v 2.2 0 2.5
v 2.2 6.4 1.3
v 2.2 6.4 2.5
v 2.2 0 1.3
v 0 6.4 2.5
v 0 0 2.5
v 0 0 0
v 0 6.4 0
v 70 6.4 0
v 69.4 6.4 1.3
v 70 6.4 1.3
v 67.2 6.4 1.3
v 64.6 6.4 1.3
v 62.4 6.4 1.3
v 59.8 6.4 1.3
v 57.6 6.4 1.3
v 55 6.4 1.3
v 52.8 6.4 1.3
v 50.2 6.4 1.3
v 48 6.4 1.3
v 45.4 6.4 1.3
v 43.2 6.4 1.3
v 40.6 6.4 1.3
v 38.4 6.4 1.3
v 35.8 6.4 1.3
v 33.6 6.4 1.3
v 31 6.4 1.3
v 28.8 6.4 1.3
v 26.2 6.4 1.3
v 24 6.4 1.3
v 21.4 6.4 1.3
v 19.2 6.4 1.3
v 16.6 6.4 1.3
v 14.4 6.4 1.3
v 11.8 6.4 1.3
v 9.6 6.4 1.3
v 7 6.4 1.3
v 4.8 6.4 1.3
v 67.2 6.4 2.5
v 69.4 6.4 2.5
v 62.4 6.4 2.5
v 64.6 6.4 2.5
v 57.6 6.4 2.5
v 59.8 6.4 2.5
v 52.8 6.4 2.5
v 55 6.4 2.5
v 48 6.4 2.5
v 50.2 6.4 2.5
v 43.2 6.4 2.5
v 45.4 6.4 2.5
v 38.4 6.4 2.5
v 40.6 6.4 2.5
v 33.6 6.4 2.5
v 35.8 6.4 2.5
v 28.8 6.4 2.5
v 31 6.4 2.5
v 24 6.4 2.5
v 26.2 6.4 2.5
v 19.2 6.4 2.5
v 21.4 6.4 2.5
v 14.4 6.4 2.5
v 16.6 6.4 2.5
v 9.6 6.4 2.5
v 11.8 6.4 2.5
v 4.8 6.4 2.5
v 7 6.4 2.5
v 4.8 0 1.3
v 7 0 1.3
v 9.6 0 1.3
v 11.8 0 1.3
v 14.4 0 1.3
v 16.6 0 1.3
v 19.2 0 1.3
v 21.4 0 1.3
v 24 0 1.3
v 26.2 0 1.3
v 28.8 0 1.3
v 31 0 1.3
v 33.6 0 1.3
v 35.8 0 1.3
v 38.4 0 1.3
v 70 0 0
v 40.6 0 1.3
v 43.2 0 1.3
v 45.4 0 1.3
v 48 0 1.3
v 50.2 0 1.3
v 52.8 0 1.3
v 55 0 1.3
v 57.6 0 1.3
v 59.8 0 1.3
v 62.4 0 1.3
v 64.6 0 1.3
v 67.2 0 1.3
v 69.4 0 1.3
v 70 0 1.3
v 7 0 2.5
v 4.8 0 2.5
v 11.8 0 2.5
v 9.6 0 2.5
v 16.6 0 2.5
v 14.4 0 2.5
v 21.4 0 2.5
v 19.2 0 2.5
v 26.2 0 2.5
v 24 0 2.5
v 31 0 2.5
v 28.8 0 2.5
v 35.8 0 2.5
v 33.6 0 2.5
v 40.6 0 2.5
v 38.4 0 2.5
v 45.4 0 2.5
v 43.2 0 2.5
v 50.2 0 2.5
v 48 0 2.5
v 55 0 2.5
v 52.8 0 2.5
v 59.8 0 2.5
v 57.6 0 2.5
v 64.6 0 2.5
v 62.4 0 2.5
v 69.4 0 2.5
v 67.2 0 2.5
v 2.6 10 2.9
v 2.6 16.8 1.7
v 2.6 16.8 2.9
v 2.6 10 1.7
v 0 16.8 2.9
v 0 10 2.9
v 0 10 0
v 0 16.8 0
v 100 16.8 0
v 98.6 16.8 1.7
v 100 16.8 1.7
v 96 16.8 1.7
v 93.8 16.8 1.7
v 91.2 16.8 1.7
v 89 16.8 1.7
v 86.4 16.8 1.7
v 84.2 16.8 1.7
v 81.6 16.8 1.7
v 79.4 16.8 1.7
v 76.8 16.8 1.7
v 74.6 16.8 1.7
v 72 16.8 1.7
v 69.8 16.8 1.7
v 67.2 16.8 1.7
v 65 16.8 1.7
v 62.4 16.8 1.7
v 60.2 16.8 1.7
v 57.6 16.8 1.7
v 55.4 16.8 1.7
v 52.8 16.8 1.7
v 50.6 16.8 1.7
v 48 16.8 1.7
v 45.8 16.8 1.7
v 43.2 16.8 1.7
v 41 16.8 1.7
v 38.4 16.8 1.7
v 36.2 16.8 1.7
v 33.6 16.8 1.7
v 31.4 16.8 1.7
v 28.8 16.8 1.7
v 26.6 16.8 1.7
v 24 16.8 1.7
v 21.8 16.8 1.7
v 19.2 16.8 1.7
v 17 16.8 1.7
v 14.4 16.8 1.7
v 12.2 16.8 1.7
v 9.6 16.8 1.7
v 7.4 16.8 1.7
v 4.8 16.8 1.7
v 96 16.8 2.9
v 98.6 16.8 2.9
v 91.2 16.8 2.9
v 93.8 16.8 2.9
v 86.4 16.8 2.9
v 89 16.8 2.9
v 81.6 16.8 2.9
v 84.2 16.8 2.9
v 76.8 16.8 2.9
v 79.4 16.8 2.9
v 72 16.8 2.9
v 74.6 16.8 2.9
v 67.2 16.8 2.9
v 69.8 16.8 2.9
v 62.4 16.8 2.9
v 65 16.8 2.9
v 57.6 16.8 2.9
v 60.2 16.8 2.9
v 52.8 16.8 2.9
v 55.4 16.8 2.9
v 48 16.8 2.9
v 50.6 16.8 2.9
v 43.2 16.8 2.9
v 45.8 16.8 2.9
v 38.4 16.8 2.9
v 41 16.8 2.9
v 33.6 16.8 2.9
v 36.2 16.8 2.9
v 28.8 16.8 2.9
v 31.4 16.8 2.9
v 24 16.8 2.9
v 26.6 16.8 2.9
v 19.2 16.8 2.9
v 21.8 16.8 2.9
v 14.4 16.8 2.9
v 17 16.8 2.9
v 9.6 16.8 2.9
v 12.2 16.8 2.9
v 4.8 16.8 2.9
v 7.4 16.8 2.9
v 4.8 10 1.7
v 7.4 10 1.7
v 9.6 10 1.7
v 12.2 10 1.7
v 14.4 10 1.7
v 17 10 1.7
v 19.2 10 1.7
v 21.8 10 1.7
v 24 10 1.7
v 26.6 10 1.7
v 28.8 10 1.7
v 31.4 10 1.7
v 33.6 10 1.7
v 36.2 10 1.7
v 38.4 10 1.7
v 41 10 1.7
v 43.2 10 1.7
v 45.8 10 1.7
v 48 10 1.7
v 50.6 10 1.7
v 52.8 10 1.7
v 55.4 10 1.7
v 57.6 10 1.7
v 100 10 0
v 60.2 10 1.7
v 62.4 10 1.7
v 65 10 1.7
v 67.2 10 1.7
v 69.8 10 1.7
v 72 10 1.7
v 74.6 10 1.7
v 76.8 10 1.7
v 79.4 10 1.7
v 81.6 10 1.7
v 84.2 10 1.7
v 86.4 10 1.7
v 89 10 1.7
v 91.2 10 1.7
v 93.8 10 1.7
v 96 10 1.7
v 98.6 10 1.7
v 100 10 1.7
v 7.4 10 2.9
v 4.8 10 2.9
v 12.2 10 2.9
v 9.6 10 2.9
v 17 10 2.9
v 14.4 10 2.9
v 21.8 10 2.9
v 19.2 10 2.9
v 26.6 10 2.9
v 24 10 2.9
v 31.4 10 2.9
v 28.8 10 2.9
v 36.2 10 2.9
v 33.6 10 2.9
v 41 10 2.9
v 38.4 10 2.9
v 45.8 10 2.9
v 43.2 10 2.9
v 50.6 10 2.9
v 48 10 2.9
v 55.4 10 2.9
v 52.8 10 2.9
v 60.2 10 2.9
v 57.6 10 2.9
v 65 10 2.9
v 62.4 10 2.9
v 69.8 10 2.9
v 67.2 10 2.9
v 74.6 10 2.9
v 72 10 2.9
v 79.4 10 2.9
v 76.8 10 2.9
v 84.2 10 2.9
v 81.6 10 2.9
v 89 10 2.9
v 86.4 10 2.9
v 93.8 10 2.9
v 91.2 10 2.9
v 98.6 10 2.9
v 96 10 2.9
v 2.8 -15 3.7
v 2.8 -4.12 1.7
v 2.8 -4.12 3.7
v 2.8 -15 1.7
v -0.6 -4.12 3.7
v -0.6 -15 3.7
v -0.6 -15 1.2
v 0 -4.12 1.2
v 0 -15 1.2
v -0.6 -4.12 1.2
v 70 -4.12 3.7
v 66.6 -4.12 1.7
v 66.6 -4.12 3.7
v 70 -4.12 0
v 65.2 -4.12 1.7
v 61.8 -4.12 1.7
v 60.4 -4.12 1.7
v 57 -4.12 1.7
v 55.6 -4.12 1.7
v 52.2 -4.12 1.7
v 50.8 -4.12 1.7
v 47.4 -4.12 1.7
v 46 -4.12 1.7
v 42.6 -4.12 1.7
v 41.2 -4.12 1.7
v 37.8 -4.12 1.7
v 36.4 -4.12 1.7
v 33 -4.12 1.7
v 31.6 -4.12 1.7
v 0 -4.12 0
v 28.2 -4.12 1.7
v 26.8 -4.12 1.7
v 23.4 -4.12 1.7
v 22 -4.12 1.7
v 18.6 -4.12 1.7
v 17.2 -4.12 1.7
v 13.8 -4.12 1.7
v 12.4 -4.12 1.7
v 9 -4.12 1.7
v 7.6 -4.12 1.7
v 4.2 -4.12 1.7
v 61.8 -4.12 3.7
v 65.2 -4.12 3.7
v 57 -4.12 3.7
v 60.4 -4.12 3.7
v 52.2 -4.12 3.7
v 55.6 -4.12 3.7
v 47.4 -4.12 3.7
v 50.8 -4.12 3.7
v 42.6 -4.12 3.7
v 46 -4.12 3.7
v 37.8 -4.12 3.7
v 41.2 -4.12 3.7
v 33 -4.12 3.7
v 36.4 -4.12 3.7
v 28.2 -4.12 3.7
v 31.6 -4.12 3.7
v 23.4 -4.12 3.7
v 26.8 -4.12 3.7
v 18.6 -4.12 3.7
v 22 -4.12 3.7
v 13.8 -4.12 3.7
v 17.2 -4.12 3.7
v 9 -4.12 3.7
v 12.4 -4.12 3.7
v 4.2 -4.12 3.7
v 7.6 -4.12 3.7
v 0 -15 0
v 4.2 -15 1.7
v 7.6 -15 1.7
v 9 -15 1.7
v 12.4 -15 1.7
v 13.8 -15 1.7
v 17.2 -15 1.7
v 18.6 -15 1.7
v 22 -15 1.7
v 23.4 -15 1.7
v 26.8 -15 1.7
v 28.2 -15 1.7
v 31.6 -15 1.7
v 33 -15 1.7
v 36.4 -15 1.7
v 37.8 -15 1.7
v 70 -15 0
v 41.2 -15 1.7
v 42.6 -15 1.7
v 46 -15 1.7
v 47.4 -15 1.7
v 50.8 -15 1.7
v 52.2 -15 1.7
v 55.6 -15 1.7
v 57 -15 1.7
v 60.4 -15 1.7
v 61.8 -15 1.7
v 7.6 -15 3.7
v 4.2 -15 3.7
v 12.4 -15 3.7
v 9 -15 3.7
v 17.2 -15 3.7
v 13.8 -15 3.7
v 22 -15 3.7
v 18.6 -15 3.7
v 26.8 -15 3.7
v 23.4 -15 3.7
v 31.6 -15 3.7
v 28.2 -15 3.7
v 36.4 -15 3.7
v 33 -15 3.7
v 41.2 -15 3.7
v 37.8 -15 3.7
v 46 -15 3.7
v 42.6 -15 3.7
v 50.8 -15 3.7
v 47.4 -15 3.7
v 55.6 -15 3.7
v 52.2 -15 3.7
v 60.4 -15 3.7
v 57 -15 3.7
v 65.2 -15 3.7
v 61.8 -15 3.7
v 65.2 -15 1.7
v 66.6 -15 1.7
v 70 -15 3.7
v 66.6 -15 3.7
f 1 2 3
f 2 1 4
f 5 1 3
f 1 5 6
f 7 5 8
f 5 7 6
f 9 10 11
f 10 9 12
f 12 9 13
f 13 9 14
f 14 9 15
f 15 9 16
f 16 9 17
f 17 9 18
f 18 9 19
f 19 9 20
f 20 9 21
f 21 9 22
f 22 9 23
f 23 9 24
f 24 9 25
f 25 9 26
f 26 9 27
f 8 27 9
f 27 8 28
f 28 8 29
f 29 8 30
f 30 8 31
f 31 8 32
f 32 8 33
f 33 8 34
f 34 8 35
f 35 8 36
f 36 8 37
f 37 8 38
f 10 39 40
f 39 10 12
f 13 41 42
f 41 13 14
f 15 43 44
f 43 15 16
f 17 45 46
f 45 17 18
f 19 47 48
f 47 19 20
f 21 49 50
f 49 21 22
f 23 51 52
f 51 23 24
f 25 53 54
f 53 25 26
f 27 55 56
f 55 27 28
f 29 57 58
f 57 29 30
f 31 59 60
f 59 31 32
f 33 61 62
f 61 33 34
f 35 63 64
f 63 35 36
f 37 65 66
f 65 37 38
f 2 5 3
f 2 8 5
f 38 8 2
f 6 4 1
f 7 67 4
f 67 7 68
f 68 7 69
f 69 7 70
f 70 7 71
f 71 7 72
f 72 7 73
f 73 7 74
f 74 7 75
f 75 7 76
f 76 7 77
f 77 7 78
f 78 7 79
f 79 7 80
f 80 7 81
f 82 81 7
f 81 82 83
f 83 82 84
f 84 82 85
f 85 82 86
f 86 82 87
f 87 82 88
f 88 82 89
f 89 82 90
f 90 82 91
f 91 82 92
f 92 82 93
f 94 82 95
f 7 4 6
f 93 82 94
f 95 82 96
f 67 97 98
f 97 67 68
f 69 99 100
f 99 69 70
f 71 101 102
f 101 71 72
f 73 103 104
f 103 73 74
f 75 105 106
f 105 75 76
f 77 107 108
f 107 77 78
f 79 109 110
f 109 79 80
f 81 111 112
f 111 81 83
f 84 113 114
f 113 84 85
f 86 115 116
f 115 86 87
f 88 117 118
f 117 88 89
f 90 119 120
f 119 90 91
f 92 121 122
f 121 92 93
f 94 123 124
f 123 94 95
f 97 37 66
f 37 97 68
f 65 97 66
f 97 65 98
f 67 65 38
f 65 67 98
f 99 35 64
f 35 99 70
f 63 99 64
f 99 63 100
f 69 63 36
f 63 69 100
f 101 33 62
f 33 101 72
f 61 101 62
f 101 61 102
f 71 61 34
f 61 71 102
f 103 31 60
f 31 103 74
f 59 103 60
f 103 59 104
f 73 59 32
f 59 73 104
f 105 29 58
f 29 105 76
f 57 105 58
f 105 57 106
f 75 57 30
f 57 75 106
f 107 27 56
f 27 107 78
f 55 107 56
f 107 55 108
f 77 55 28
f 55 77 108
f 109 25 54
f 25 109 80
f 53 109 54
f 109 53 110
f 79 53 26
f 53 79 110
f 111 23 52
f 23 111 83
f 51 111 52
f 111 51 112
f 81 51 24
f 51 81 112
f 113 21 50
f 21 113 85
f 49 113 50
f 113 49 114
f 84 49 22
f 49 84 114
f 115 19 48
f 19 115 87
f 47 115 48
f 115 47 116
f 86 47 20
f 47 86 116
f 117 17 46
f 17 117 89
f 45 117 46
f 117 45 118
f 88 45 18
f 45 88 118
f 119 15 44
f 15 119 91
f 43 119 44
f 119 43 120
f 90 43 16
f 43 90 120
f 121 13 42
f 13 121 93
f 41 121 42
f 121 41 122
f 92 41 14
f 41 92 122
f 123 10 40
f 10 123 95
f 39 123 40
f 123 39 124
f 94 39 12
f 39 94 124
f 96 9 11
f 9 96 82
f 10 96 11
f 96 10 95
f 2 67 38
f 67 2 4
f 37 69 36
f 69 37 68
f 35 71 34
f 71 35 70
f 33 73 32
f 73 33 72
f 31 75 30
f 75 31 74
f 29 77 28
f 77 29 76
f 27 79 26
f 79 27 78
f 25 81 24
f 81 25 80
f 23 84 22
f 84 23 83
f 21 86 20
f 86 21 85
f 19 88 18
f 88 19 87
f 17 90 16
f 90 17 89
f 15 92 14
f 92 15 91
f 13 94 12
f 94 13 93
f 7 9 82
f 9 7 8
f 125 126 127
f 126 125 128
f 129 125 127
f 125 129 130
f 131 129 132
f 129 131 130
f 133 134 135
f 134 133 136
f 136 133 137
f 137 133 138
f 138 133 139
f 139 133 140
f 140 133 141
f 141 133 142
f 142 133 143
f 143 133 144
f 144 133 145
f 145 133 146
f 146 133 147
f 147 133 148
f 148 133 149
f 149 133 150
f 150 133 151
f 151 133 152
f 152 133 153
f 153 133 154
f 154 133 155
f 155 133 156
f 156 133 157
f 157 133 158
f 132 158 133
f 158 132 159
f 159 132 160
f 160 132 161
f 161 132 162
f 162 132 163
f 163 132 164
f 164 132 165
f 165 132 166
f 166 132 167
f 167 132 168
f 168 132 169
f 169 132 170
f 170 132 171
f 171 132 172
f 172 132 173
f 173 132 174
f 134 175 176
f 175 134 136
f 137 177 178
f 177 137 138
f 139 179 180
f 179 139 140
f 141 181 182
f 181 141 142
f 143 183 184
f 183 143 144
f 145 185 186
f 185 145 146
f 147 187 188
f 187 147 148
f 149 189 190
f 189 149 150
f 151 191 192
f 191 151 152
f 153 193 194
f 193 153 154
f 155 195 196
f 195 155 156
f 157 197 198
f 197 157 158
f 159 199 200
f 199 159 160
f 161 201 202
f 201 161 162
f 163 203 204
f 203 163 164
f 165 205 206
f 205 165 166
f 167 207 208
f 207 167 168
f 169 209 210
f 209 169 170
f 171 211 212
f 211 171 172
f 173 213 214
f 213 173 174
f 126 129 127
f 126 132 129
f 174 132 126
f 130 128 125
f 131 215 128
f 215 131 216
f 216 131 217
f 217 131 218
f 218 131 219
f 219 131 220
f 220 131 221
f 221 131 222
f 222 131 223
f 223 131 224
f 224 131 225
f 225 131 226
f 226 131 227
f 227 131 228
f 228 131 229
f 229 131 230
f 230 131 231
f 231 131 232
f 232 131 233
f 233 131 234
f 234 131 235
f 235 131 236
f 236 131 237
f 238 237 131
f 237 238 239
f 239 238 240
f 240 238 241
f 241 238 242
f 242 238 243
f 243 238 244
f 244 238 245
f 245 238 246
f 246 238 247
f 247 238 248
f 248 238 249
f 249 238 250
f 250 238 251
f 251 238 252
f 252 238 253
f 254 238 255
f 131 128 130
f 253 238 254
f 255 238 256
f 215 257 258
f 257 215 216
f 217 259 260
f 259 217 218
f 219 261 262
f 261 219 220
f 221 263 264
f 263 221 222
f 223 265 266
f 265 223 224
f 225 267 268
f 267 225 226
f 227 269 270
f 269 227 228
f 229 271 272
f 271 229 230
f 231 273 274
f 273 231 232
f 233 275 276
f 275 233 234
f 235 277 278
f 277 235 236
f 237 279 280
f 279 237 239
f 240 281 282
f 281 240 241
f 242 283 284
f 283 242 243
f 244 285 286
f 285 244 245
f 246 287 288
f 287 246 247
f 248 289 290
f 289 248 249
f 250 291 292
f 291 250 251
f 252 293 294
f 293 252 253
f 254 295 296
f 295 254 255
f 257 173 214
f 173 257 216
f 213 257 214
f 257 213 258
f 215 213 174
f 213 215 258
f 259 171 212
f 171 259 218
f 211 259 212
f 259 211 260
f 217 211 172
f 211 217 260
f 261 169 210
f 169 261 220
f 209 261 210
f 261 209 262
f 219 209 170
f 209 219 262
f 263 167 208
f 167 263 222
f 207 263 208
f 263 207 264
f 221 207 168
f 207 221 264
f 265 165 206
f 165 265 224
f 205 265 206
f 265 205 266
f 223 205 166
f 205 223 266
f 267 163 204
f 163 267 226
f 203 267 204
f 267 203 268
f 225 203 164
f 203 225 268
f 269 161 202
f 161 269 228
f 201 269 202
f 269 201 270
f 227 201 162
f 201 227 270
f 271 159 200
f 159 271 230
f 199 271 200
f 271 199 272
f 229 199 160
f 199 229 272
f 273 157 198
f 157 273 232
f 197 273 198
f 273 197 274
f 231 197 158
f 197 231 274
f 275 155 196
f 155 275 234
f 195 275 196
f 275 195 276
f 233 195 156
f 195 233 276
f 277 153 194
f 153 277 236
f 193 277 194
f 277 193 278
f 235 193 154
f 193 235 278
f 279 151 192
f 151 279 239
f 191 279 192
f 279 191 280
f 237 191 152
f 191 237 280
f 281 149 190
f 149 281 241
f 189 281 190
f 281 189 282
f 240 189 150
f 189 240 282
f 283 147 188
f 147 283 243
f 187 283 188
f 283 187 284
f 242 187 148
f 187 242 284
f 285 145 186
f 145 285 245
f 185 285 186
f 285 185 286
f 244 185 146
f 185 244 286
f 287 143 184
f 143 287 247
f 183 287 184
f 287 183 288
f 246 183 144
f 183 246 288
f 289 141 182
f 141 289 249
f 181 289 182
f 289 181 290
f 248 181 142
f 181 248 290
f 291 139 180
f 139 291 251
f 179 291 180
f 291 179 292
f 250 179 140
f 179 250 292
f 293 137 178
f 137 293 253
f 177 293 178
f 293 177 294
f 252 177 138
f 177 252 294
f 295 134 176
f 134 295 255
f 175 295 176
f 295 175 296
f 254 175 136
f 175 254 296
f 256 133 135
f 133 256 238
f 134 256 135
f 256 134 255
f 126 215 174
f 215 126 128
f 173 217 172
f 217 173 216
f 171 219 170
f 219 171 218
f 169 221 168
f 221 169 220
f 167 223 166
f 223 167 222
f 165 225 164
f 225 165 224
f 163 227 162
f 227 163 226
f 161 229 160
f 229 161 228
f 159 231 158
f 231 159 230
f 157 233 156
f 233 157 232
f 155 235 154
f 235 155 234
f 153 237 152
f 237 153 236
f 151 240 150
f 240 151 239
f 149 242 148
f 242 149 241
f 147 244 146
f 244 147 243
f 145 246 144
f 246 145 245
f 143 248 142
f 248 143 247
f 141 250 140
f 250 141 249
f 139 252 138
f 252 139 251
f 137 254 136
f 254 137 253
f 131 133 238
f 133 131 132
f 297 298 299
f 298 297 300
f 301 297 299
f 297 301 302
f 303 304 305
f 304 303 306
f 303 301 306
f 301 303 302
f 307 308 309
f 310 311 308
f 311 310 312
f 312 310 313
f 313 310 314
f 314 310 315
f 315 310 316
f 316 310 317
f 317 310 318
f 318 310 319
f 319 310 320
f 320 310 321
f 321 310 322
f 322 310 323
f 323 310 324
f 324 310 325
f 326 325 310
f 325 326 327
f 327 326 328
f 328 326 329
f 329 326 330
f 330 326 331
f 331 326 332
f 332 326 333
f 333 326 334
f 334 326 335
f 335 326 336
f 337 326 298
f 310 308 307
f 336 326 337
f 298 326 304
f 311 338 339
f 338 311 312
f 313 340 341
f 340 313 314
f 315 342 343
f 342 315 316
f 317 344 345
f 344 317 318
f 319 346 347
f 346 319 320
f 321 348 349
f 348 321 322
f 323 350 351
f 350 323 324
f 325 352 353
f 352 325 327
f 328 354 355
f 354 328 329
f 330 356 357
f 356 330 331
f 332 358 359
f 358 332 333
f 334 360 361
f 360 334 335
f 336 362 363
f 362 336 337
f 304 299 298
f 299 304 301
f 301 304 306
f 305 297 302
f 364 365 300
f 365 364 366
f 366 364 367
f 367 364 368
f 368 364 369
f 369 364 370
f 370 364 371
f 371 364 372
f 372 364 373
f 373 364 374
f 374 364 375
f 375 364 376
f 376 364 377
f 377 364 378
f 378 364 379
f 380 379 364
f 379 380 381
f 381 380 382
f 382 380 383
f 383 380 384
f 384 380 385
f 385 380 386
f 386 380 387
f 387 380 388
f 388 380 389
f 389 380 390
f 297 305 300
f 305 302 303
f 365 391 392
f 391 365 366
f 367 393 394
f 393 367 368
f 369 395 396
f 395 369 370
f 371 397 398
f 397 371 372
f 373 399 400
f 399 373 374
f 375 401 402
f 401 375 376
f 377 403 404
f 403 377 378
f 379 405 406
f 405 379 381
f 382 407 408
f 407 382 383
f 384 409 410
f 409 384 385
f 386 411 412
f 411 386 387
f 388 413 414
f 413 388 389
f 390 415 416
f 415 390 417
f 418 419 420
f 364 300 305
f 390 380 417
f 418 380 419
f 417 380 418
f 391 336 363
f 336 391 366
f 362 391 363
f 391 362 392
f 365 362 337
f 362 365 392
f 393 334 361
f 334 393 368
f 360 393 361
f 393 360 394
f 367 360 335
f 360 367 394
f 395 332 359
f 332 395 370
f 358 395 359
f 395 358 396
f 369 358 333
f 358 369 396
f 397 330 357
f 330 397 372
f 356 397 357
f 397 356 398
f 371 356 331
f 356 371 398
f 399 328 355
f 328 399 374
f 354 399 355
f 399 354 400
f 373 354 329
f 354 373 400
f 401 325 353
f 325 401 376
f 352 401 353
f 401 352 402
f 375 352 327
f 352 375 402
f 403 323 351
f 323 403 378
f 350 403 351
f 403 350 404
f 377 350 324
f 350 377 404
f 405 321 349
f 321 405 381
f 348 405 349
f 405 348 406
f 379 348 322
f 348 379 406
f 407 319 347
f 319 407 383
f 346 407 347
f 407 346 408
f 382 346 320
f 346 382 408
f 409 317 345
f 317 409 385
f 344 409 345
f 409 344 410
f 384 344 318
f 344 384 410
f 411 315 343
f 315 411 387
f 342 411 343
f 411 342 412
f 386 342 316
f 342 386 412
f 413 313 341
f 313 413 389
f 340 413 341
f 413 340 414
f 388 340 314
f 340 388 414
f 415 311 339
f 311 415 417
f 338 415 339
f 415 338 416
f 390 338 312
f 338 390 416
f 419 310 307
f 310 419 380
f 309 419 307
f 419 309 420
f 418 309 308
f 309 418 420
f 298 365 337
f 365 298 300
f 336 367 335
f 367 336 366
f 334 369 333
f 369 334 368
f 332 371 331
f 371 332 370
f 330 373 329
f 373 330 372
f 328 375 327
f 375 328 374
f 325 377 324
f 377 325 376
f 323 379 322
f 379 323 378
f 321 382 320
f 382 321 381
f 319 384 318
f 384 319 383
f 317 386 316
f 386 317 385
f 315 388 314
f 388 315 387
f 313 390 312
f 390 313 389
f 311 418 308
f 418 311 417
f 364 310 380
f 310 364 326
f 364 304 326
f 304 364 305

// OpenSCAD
function 2XLBeltBaseHeight(3dPrinterTolerance=.4)= 1.3 + 3dPrinterTolerance;
function 2XLBeltGripHeight(3dPrinterTolerance=.4)= 2.5 + .5 + 3dPrinterTolerance;
function 2XLBeltToothWidth(3dPrinterTolerance=.4)= 2.2 + 3dPrinterTolerance;
function 2XLBeltSpaceWidth(3dPrinterTolerance=0)= 2.6 + 3dPrinterTolerance;
function 2XLBeltWidth(3dPrinterTolerance=.4)= 6.4 + 3dPrinterTolerance;
function 2XLBeltPitch()= 5.08;
function 2XLBeltSlotWidth(3dPrinterTolerance=.4)=2XLBeltWidth(3dPrinterTolerance)*1.6;


function 2XLBeltAvgHeight(3dPrinterTolerance=.4)=(2XLBeltBaseHeight()+2XLBeltGripHeight()*2)/3;


module 2XLTimingBelt(3dPrinterTolerance=.4, Length=70,) {
	cube([Length,2XLBeltWidth(3dPrinterTolerance),2XLBeltBaseHeight(3dPrinterTolerance)]) ;
	for (inc = [0:(2XLBeltToothWidth(3dPrinterTolerance)
+2XLBeltSpaceWidth(0)-3dPrinterTolerance):Length-2XLBeltToothWidth(3dPrinterTolerance)]) translate([inc,0,2XLBeltBaseHeight(3dPrinterTolerance)-.5]) #cube([2XLBeltToothWidth(3dPrinterTolerance)
,2XLBeltWidth(3dPrinterTolerance),(2XLBeltGripHeight(3dPrinterTolerance)-2XLBeltBaseHeight(3dPrinterTolerance))]) ;
}

color("blue")
2XLTimingBelt(0);

translate([0,10,0])
color("red")
2XLTimingBelt(.4, 100);

module 2XLTimingBeltSlot(3dPrinterTolerance=.4, Length=70) {
	cube([Length,2XLBeltSlotWidth(3dPrinterTolerance),2XLBeltBaseHeight(3dPrinterTolerance)]) ;
	for (inc = [0:(2XLBeltToothWidth(3dPrinterTolerance)
+2XLBeltSpaceWidth(0)-3dPrinterTolerance):Length-2XLBeltToothWidth(3dPrinterTolerance)
]) translate([inc-3dPrinterTolerance*1.5,0,2XLBeltBaseHeight(3dPrinterTolerance)-.5]) cube([2XLBeltToothWidth(3dPrinterTolerance*3)
,2XLBeltSlotWidth(3dPrinterTolerance),(2XLBeltGripHeight(3dPrinterTolerance*3)-2XLBeltBaseHeight(3dPrinterTolerance))]) ;
}

translate([0,-15,0])
2XLTimingBeltSlot();
